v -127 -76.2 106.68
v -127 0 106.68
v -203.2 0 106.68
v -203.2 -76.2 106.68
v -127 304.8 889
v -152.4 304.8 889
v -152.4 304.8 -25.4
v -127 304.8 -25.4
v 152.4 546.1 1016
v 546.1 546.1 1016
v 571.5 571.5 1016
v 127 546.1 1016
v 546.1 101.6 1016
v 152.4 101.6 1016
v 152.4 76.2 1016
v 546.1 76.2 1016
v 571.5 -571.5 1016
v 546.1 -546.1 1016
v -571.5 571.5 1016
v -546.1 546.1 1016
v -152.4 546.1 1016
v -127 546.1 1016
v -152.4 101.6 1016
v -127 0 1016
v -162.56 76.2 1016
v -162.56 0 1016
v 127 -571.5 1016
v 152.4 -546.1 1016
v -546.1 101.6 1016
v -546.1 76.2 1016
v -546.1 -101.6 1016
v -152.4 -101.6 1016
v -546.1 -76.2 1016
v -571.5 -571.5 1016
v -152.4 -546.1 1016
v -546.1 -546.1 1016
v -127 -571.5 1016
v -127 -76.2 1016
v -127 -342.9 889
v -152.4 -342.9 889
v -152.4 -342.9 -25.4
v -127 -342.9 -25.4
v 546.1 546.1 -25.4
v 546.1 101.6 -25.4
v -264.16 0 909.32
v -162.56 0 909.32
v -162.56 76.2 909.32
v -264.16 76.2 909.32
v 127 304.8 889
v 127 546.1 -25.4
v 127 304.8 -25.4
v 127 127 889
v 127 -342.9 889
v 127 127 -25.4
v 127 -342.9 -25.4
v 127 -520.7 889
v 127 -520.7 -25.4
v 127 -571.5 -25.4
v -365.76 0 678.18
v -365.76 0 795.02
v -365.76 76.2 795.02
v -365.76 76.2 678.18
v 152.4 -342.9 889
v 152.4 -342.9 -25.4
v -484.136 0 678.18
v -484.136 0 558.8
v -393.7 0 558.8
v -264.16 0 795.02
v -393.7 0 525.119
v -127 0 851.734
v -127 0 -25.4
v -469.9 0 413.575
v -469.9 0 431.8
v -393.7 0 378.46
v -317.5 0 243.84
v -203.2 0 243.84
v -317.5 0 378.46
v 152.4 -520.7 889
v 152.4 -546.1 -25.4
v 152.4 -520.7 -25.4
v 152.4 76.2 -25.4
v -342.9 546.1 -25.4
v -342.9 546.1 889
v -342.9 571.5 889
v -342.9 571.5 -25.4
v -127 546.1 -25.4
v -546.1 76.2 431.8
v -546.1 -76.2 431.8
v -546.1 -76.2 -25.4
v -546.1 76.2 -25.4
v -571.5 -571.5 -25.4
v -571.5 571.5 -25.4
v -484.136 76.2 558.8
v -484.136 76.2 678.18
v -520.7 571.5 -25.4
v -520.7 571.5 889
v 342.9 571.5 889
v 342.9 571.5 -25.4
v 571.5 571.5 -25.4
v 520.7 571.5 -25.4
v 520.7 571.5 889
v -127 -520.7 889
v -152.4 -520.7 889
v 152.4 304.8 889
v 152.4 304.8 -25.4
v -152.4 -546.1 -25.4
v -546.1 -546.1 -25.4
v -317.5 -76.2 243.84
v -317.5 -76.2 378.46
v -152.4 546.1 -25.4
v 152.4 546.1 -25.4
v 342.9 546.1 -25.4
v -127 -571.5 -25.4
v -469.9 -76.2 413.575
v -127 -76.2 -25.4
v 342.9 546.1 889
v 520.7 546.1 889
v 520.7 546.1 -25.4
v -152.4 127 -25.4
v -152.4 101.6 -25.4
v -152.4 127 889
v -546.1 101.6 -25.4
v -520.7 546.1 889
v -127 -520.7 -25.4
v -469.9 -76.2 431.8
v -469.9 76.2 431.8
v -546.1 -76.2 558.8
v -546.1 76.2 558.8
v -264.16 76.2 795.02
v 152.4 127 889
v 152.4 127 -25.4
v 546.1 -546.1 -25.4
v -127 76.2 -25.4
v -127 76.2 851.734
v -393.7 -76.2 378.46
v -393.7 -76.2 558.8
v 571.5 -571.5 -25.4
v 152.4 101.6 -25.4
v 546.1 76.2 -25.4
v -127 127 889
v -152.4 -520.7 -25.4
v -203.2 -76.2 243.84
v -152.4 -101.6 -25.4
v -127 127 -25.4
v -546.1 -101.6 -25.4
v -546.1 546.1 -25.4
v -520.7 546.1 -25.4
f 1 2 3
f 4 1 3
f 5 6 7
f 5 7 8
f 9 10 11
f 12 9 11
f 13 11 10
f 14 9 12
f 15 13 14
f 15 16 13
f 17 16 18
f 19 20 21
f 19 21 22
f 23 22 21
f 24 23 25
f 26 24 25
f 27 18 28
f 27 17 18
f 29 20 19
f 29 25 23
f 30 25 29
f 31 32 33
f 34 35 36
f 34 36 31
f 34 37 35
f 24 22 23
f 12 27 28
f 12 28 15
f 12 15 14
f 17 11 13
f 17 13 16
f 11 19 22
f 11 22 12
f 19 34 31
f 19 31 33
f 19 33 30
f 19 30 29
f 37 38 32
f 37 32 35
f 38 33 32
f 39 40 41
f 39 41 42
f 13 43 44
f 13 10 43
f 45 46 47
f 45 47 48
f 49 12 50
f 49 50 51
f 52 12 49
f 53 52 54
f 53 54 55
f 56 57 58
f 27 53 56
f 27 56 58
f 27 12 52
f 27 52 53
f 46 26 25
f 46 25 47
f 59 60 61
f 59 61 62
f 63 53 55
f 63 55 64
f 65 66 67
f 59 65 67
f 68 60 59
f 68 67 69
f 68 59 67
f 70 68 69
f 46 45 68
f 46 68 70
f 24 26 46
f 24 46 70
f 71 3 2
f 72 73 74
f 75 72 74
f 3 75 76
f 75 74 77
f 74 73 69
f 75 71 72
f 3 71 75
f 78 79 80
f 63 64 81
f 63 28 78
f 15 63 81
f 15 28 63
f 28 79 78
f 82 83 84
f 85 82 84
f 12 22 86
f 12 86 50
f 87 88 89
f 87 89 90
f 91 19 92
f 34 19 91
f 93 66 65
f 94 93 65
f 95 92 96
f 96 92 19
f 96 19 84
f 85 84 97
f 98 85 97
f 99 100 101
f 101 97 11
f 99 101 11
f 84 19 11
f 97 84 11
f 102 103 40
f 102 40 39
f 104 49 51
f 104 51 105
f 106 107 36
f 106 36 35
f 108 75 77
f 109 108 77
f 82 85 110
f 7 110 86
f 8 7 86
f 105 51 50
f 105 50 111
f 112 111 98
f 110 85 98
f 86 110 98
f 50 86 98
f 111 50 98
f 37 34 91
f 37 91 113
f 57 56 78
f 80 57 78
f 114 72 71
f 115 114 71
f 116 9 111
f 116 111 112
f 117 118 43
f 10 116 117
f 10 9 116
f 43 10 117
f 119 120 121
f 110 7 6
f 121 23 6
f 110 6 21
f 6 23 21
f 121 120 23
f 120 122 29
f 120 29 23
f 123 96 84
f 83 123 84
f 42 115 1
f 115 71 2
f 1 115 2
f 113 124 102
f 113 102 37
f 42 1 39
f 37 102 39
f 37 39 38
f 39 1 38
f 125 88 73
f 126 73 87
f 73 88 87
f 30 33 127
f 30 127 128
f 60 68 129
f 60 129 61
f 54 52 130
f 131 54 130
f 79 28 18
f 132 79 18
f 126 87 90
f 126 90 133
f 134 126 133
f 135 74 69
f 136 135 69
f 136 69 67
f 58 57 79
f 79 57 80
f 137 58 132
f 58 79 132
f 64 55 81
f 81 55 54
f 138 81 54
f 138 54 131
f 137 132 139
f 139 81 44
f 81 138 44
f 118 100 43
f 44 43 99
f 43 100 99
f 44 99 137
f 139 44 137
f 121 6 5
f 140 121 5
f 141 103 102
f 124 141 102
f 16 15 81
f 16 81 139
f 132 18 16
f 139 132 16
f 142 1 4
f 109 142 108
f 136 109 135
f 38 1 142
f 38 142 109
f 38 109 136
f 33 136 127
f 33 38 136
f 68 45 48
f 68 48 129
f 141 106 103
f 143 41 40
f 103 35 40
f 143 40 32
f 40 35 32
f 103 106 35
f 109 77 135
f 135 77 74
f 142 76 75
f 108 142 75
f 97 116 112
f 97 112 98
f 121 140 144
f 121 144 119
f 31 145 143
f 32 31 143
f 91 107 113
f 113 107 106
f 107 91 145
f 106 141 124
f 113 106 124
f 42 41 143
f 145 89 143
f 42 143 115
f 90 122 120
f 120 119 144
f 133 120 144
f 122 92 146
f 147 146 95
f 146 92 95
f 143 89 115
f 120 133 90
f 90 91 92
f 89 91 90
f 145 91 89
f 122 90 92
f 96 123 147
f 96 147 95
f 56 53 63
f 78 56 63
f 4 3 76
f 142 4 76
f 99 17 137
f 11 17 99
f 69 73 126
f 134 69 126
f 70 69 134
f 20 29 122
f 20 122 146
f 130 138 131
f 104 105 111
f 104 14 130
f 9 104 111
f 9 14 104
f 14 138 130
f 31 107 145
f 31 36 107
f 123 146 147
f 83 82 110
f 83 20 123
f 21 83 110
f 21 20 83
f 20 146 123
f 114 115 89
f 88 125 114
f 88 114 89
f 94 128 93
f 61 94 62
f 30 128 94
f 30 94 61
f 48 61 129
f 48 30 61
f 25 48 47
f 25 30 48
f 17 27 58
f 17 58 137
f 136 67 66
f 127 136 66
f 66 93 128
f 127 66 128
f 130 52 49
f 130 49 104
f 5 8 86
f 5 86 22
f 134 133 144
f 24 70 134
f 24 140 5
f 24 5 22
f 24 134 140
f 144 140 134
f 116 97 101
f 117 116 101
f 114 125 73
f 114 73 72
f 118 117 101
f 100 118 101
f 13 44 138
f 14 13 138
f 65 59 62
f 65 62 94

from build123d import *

# Parameters (mm, degrees)
F0_W          = 393.7
F0_H          = 25.4
F0_W_2        = 25.4
F0_H_2        = 241.3
F0_H_3        = 444.5
F0_H_4        = 152.4
F0_H_5        = 12.7
F1_DEPTH      = 1016
F1_DEPTH_BACK = 25.4
F0_W_3        = 190.5
F0_W_4        = 254
F0_H_6        = 419.1
F0_H_7        = 622.3
F2_W          = 177.8
F2_H          = 25.4
F2_W_2        = 25.4
F2_H_2        = 177.8
F3_DEPTH      = 127
F5_W          = 152.4
F5_H          = 127
F6_DEPTH      = 76.2
F10_W         = 14.2358661652
F10_H         = 119.38
F11_DEPTH     = 76.2
F12_DEPTH     = 76.2


with BuildPart() as f1:
    # F0 (on Top) → F1 (new body, two sides)
    with BuildSketch(Plane.XY) as f1_sk:
        with Locations((-349.25, -88.9)):
            Rectangle(F0_W, F0_H)
        with Locations((-139.7, -88.9)):
            Rectangle(F0_W_2, F0_H)
        with Locations((-139.7, -222.25)):
            Rectangle(F0_W_2, F0_H_2)
        with Locations((-558.8, -323.85)):
            Rectangle(F0_W_2, F0_H_3)
        with Locations((-558.8, -88.9)):
            Rectangle(F0_W_2, F0_H)
        with Locations((-558.8, 0)):
            Rectangle(F0_W_2, F0_H_4)
        with Locations((-558.8, 82.55)):
            Rectangle(F0_W_2, F0_H_5)
        with Locations((-558.8, 95.25)):
            Rectangle(F0_W_2, F0_H_5)
        with Locations((-558.8, 323.85)):
            Rectangle(F0_W_2, F0_H_3)
        with Locations((-558.8, 558.8)):
            Rectangle(F0_W_2, F0_H)
        with Locations((-533.4, 558.8)):
            Rectangle(F0_W_2, F0_H)
        Polygon((-152.4, 101.6), (-127, 101.6), (-127, 103.0518114567), (-127, 127), (-152.4, 127), align=None)
        Polygon((-152.4, 88.9), (-152.4, 76.2), (-127, 76.2), (-127, 101.6), (-152.4, 101.6), align=None)
        with Locations((-349.25, 95.25)):
            Rectangle(F0_W, F0_H_5)
        with Locations((-349.25, 82.55)):
            Rectangle(F0_W, F0_H_5)
        with Locations((-139.7, -533.4)):
            Rectangle(F0_W_2, F0_H)
        with Locations((-349.25, -558.8)):
            Rectangle(F0_W, F0_H)
        with Locations((-558.8, -558.8)):
            Rectangle(F0_W_2, F0_H)
        with Locations((-139.7, -558.8)):
            Rectangle(F0_W_2, F0_H)
    extrude(amount=F1_DEPTH)
    extrude(f1_sk.sketch, amount=-F1_DEPTH_BACK)



with BuildPart() as f1b:
    # F0 (on Top) → F1, piece 2 (new body, two sides)
    with BuildSketch(Plane.XY) as f1_2_sk:
        with Locations((-247.65, 558.8)):
            Rectangle(F0_W_3, F0_H)
        with Locations((-139.7, 558.8)):
            Rectangle(F0_W_2, F0_H)
        with Locations((-139.7, 425.45)):
            Rectangle(F0_W_2, F0_H_2)
        with Locations((247.65, 558.8)):
            Rectangle(F0_W_3, F0_H)
        with Locations((139.7, 558.8)):
            Rectangle(F0_W_2, F0_H)
        with Locations((139.7, 425.45)):
            Rectangle(F0_W_2, F0_H_2)
        with Locations((0, 558.8)):
            Rectangle(F0_W_4, F0_H)
    extrude(amount=F1_DEPTH)
    extrude(f1_2_sk.sketch, amount=-F1_DEPTH_BACK)


with BuildPart() as f1c:
    # F0 (on Top) → F1, piece 3 (new body, two sides)
    with BuildSketch(Plane.XY) as f1_3_sk:
        with Locations((349.25, 82.55)):
            Rectangle(F0_W, F0_H_5)
        Polygon((152.4, 88.9), (546.1, 88.9), (546.1, 101.6), (152.4, 101.6), (152.4, 101.5882790089), align=None)
        Polygon((127, 101.6), (127, 88.9), (152.4, 88.9), (152.4, 101.5882790089), (152.4, 101.6), align=None)
        with Locations((139.7, 114.3)):
            Rectangle(F0_W_2, F0_H)
        with Locations((139.7, 82.55)):
            Rectangle(F0_W_2, F0_H_5)
        with Locations((139.7, -133.35)):
            Rectangle(F0_W_2, F0_H_6)
        with Locations((139.7, -533.4)):
            Rectangle(F0_W_2, F0_H)
        with Locations((139.7, -558.8)):
            Rectangle(F0_W_2, F0_H)
        with Locations((349.25, -558.8)):
            Rectangle(F0_W, F0_H)
        with Locations((558.8, -234.95)):
            Rectangle(F0_W_2, F0_H_7)
        with Locations((558.8, -558.8)):
            Rectangle(F0_W_2, F0_H)
        with Locations((558.8, 95.25)):
            Rectangle(F0_W_2, F0_H_5)
        with Locations((558.8, 82.55)):
            Rectangle(F0_W_2, F0_H_5)
        with Locations((558.8, 323.85)):
            Rectangle(F0_W_2, F0_H_3)
        with Locations((558.8, 558.8)):
            Rectangle(F0_W_2, F0_H)
        with Locations((533.4, 558.8)):
            Rectangle(F0_W_2, F0_H)
    extrude(amount=F1_DEPTH)
    extrude(f1_3_sk.sketch, amount=-F1_DEPTH_BACK)


with BuildPart() as f1_1:
    add(f1.part)

    add(f1b.part)  # F3 merges F1b

    add(f1c.part)  # F3 merges F1c
    # F2 (on face) → F3 (join)
    with BuildSketch(Plane.XY.offset(1016)):
        with Locations((-431.8, 558.8)):
            Rectangle(F2_W, F2_H)
        with Locations((-139.7, -431.8)):
            Rectangle(F2_W_2, F2_H_2)
        with Locations((139.7, -431.8)):
            Rectangle(F2_W_2, F2_H_2)
        with Locations((431.8, 558.8)):
            Rectangle(F2_W, F2_H)
        with Locations((139.7, 215.9)):
            Rectangle(F2_W_2, F2_H_2)
        with Locations((-139.7, 215.9)):
            Rectangle(F2_W_2, F2_H_2)
    extrude(amount=-F3_DEPTH)

    # F4: union 

    # F5 (on face) → F6 (join)
    with BuildSketch(Plane.YZ.offset(-546.1)):
        with Locations((0, 495.3)):
            Rectangle(F5_W, F5_H)
    extrude(amount=F6_DEPTH)

    # F10 (on offset) → F11 (join, through all)
    with BuildSketch(Plane.XZ):
        Polygon((-469.9, 678.18), (-469.9, 558.8), (-393.7, 558.8), (-393.7, 525.1186495463), (-127, 851.7339229584), (-127, 1016), (-162.56, 1016), (-162.56, 909.32), (-264.16, 909.32), (-264.16, 795.02), (-365.76, 795.02), (-365.76, 678.18), align=None)
        with Locations((-477.0179330826, 618.49)):
            Rectangle(F10_W, F10_H)
        Polygon((-393.7, 558.8), (-469.9, 558.8), (-469.9, 431.8), (-393.7, 525.1186495463), align=None)
    extrude(amount=-F11_DEPTH)

    # F10 (on offset) → F12 (join, through all)
    with BuildSketch(Plane.XZ):
        Polygon((-393.7, 525.1186495463), (-469.9, 431.8), (-469.9, 413.5754568294), (-127, -25.4), (-127, 5.08), (-127, 106.68), (-203.2, 106.68), (-203.2, 243.84), (-317.5, 243.84), (-317.5, 378.46), (-393.7, 378.46), (-393.7, 431.8), align=None)
        Polygon((-393.7, 558.8), (-469.9, 558.8), (-469.9, 431.8), (-393.7, 525.1186495463), align=None)
    extrude(amount=F12_DEPTH)


solid = f1_1.part
